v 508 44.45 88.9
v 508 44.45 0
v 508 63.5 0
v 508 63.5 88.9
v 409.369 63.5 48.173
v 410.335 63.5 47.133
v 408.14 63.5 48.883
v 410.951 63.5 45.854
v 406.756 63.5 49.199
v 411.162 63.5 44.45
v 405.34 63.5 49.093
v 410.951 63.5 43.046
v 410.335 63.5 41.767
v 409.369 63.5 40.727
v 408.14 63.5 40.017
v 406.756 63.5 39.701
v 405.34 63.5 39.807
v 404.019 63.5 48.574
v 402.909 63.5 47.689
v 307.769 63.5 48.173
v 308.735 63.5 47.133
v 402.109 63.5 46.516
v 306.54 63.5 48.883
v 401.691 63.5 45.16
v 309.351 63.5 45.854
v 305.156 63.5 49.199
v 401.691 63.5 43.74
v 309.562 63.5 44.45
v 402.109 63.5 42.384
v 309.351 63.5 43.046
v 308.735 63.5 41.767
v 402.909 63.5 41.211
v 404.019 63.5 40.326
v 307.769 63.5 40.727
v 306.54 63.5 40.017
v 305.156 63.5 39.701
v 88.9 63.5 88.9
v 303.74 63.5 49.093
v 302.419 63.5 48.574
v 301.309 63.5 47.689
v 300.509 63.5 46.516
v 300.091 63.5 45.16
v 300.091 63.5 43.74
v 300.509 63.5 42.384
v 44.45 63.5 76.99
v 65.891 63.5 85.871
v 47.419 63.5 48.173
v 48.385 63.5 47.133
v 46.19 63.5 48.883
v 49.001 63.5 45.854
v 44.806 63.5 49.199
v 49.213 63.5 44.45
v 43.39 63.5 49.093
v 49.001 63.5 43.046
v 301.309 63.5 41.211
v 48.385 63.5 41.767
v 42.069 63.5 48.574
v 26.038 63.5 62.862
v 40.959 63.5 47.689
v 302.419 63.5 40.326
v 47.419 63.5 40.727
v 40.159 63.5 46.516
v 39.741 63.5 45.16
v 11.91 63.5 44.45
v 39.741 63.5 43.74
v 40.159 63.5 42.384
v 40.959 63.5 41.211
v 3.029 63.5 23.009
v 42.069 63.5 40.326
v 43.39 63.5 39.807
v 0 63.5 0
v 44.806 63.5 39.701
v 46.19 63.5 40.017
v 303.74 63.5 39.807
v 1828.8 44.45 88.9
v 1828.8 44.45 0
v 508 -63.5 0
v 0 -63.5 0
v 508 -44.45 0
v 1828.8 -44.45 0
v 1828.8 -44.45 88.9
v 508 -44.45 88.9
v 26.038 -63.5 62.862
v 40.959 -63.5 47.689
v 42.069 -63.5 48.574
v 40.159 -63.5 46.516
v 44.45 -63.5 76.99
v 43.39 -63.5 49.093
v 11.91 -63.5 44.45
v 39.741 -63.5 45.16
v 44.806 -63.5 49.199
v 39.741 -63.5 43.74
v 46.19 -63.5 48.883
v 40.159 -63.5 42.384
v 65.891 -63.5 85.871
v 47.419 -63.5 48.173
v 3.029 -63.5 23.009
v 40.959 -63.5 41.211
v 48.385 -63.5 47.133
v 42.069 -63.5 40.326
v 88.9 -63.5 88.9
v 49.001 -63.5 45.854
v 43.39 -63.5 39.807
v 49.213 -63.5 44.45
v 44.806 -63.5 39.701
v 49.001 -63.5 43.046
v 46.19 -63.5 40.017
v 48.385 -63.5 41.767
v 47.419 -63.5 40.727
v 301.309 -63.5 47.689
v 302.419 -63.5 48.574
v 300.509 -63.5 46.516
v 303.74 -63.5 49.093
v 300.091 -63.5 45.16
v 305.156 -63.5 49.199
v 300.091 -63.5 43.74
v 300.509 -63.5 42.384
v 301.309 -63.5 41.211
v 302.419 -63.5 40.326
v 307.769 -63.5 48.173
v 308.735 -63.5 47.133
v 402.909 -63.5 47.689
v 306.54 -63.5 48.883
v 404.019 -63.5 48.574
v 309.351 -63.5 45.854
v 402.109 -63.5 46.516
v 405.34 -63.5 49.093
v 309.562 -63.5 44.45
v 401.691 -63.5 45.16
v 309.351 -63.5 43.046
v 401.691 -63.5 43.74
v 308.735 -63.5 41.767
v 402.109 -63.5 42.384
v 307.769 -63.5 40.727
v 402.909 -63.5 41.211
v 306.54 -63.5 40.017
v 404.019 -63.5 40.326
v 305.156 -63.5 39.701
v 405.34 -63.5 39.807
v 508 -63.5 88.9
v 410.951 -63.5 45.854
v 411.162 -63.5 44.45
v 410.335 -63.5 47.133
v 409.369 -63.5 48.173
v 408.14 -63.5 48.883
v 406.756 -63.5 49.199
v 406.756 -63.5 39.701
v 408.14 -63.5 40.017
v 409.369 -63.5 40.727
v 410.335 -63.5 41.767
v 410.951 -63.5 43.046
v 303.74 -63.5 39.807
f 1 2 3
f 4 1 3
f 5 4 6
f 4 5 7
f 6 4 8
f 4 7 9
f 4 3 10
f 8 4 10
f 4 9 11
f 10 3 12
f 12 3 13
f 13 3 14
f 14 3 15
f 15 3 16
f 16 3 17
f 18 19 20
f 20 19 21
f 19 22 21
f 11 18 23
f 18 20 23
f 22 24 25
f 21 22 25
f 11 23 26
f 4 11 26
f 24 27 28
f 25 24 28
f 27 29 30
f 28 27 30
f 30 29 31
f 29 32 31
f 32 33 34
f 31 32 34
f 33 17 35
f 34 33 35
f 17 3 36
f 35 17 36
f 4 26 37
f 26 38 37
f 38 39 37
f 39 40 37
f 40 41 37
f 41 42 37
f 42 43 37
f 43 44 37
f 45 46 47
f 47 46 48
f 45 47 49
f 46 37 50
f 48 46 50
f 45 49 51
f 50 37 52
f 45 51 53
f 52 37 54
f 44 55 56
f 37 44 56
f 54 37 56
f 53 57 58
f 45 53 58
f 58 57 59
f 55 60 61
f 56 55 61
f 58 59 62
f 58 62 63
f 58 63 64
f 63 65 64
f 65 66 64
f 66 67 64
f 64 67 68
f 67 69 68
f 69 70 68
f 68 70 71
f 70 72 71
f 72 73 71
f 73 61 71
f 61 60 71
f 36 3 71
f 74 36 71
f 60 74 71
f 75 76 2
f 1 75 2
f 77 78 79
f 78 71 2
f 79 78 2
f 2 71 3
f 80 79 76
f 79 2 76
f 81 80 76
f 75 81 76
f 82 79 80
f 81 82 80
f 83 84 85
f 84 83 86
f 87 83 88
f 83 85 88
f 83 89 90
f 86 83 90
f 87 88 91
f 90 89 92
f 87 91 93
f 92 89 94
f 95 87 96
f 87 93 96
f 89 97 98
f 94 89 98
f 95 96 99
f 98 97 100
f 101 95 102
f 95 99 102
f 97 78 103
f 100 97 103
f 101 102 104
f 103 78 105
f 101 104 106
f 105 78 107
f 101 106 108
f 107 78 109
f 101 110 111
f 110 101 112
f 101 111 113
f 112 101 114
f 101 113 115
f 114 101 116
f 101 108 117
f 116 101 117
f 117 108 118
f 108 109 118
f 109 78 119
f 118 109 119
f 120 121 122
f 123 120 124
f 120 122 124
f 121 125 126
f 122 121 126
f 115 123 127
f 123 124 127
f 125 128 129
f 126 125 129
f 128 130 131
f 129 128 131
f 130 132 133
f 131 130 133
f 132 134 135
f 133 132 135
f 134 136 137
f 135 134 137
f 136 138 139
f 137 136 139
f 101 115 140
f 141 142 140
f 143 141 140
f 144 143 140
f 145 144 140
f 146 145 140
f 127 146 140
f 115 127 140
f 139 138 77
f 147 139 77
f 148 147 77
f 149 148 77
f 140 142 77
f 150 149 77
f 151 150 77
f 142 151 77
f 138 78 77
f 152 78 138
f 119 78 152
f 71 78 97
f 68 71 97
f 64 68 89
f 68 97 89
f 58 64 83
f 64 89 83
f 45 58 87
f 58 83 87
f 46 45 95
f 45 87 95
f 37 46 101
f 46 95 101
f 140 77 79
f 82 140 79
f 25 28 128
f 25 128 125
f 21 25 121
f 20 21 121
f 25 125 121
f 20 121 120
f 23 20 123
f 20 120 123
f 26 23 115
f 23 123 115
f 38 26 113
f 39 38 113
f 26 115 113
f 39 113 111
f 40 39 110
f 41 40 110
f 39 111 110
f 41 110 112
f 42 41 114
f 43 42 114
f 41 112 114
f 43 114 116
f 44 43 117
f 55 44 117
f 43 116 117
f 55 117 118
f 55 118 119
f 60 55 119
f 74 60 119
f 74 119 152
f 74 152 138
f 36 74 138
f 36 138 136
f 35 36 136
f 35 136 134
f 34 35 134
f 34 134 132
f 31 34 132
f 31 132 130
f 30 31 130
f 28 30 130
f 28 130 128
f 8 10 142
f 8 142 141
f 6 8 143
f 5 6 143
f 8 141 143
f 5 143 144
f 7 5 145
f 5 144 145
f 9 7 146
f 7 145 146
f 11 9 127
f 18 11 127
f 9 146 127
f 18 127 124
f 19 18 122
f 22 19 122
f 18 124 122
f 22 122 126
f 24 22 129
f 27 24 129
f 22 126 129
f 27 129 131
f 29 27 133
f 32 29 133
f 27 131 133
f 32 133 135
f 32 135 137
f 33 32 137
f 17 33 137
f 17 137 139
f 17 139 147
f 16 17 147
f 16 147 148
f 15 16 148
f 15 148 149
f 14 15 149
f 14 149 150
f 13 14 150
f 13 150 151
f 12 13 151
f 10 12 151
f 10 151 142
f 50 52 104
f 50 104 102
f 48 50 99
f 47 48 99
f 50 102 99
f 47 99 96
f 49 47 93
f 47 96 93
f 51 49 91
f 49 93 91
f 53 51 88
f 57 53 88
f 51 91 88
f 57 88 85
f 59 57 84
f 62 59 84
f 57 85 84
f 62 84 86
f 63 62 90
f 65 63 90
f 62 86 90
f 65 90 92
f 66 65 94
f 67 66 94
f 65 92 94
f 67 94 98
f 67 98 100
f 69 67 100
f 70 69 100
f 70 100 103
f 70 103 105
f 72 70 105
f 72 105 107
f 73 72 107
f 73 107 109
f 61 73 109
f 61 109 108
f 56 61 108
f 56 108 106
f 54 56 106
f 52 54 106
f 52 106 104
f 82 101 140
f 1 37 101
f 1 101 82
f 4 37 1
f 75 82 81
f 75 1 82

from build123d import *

# Parameters (mm, degrees)
F1_DEPTH = 88.9
F2_R     = 4.7625
F3_DEPTH = 127.001
F5_DEPTH = 127.001


with BuildPart() as f1:
    # F0 (on Top) → F1 (new body)
    with BuildSketch(Plane.XY):
        Polygon((508, -63.5), (508, -44.45), (1828.8, -44.45), (1828.8, 44.45), (508, 44.45), (508, 63.5), (0, 63.5), (0, 44.45), (0, -44.45), (0, -63.5), align=None)
    extrude(amount=F1_DEPTH)

    # F2 (on face) → F3 (cut, through all)
    with BuildSketch(Plane.XZ.offset(63.5)):
        with Locations((44.45, 44.45)):
            Circle(F2_R)
        with Locations((304.8, 44.45)):
            Circle(F2_R)
        with Locations((406.4, 44.45)):
            Circle(F2_R)
    extrude(amount=-F3_DEPTH, mode=Mode.SUBTRACT)

    # F4 (on face) → F5 (cut, through all)
    with BuildSketch(Plane.XZ.offset(63.5)):
        with BuildLine():
            ThreePointArc((0, 0), (26.038207, 62.861793), (88.9, 88.9))
            Line((88.9, 88.9), (0, 88.9))
            Line((0, 88.9), (0, 0))
        make_face()
    extrude(amount=-F5_DEPTH, mode=Mode.SUBTRACT)


solid = f1.part
